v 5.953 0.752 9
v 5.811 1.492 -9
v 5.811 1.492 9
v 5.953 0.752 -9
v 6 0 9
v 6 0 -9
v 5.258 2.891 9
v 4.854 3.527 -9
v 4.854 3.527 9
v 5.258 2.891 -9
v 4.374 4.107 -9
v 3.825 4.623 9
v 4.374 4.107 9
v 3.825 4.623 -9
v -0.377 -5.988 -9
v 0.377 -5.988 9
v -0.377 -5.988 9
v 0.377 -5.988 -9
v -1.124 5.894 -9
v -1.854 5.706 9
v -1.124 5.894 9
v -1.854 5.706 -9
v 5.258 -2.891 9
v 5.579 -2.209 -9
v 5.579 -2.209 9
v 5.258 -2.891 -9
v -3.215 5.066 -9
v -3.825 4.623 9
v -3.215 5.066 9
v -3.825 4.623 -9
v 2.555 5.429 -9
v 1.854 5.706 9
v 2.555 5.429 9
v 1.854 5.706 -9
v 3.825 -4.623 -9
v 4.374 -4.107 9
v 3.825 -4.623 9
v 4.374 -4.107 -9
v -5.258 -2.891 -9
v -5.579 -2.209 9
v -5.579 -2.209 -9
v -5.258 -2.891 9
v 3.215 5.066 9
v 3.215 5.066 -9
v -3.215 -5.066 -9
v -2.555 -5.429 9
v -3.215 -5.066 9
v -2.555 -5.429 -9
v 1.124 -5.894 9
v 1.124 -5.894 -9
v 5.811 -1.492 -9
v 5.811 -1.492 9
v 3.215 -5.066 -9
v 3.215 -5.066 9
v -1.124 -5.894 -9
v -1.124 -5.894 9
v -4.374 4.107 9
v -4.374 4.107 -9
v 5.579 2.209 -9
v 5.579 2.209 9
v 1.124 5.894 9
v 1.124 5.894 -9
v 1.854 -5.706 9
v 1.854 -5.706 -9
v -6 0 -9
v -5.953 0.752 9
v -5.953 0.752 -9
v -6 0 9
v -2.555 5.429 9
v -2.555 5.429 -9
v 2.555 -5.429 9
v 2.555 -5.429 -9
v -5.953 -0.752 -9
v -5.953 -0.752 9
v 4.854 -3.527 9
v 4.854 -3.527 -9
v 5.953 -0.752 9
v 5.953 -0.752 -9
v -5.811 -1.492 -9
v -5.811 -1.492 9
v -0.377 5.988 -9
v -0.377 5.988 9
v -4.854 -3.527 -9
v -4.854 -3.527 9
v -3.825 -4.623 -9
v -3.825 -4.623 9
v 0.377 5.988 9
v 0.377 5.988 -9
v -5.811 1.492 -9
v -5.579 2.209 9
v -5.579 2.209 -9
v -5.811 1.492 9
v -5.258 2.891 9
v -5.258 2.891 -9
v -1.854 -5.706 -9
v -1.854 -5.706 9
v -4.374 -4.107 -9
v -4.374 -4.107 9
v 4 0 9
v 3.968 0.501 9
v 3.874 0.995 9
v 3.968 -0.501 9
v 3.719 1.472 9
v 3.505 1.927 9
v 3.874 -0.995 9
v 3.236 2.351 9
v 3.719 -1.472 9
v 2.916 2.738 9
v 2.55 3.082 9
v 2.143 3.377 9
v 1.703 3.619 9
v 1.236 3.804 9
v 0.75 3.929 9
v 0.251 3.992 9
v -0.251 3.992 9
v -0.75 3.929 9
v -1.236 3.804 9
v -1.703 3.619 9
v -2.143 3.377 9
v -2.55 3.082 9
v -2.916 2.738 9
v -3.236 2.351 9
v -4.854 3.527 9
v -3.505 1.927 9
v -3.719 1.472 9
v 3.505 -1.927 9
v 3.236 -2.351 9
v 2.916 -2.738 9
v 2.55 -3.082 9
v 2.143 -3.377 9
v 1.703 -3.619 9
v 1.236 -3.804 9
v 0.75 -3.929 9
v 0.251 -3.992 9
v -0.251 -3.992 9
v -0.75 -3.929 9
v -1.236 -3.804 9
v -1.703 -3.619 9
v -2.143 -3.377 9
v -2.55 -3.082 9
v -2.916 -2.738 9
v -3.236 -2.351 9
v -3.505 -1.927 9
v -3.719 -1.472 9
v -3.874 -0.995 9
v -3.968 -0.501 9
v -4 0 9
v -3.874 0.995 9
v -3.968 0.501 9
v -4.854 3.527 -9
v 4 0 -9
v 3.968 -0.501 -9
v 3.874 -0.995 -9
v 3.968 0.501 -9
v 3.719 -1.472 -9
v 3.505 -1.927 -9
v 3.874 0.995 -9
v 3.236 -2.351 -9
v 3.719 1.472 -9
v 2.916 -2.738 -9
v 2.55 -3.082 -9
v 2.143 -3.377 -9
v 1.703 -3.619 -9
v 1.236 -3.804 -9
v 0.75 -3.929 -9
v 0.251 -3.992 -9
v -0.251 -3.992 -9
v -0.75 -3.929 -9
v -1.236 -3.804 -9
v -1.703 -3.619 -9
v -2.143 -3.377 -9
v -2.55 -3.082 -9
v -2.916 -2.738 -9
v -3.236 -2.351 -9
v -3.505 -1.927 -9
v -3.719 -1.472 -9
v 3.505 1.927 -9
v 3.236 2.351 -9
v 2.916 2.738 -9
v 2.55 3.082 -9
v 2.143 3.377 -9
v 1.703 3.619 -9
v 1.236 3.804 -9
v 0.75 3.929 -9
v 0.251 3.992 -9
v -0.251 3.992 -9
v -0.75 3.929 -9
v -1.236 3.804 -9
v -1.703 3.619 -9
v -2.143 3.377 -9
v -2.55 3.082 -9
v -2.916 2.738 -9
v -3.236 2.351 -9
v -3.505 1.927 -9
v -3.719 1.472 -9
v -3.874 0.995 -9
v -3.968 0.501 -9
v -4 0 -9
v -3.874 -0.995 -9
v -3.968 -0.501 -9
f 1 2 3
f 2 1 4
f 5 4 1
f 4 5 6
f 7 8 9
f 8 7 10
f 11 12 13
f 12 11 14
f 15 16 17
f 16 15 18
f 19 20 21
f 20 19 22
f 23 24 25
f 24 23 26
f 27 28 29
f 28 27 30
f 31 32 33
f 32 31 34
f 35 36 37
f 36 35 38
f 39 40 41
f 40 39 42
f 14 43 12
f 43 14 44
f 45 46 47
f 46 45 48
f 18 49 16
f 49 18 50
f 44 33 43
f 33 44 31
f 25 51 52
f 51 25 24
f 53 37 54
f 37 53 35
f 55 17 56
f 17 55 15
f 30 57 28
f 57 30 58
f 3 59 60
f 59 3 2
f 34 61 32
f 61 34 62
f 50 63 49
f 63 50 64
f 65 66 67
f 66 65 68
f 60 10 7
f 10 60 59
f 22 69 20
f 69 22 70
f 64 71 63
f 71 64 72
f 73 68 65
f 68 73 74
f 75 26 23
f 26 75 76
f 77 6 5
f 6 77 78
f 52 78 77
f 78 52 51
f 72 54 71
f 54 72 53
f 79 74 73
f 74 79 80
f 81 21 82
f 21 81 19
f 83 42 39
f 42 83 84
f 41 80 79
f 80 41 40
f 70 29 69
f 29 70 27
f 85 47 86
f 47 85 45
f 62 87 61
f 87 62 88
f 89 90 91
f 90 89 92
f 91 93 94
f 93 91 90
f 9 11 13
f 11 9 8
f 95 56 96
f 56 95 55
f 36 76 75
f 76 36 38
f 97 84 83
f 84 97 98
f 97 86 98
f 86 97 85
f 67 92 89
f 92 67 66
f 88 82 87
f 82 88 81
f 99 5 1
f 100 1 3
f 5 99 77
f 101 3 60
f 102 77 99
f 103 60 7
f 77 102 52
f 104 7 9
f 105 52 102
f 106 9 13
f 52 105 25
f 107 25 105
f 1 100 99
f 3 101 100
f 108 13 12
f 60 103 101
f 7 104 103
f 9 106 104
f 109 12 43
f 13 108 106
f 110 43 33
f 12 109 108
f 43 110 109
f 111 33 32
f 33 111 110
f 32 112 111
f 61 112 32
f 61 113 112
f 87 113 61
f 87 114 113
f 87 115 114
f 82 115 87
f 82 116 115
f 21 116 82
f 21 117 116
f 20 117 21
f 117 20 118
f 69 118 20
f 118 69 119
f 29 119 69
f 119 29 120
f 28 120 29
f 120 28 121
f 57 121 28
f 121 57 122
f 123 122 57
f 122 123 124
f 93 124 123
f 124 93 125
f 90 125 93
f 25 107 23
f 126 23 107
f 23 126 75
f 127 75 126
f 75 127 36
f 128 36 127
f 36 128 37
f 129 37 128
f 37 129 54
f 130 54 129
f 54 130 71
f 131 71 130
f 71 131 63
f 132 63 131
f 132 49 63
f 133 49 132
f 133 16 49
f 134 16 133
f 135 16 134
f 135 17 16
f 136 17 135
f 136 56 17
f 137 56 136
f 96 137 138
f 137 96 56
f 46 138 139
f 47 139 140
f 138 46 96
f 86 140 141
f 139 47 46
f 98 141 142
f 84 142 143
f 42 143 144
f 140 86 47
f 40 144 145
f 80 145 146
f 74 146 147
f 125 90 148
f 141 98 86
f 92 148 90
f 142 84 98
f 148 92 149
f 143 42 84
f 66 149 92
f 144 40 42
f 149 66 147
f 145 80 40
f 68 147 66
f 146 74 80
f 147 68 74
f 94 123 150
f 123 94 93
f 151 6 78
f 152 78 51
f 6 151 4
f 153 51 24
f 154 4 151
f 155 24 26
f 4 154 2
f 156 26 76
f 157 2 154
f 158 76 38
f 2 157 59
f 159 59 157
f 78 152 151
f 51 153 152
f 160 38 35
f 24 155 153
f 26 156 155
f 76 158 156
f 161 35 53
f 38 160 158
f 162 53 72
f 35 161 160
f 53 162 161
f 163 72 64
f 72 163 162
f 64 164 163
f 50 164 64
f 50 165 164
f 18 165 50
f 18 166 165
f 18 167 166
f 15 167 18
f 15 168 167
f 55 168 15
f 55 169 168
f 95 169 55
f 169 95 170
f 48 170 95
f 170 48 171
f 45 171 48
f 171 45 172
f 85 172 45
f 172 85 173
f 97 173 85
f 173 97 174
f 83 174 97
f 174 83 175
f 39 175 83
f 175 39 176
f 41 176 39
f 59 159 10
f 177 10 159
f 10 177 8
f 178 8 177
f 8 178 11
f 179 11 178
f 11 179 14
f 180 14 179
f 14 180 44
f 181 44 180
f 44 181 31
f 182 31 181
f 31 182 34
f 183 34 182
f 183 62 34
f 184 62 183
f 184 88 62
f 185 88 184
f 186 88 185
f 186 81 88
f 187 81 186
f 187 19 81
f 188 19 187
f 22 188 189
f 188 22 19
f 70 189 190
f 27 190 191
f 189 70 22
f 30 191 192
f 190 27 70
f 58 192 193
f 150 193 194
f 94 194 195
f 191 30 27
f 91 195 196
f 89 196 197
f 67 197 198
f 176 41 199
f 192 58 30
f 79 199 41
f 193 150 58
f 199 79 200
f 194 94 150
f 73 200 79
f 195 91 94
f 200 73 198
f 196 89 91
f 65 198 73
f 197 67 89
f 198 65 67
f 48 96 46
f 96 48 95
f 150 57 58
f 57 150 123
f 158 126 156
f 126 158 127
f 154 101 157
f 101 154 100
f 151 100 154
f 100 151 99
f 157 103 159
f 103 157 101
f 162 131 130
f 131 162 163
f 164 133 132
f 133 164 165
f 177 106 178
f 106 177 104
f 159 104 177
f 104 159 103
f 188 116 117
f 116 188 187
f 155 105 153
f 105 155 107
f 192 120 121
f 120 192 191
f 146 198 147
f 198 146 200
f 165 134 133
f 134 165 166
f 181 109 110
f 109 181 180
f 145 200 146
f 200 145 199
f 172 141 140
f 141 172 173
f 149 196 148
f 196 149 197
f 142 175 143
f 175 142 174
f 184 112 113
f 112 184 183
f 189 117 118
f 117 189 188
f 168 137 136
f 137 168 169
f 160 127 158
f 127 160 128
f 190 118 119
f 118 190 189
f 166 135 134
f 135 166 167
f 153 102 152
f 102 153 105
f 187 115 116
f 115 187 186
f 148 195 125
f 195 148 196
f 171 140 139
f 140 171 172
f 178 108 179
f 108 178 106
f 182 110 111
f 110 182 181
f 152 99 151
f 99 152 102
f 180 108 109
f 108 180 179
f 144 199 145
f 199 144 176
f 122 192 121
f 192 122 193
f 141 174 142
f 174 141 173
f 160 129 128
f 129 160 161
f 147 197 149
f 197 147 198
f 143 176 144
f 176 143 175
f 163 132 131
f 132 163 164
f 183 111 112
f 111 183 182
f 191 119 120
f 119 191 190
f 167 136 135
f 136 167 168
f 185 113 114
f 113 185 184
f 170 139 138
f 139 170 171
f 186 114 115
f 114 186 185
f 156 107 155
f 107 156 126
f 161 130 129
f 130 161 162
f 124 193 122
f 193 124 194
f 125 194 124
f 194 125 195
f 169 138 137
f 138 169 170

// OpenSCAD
$fn = 50;


difference() {
	union() {
		translate(v = [0, 0, -9.0000000000]) {
			cylinder(h = 18, r = 6.0000000000);
		}
	}
	union() {
		translate(v = [0, 0, -100.0000000000]) {
			cylinder(h = 200, r = 4.0000000000);
		}
	}
}
